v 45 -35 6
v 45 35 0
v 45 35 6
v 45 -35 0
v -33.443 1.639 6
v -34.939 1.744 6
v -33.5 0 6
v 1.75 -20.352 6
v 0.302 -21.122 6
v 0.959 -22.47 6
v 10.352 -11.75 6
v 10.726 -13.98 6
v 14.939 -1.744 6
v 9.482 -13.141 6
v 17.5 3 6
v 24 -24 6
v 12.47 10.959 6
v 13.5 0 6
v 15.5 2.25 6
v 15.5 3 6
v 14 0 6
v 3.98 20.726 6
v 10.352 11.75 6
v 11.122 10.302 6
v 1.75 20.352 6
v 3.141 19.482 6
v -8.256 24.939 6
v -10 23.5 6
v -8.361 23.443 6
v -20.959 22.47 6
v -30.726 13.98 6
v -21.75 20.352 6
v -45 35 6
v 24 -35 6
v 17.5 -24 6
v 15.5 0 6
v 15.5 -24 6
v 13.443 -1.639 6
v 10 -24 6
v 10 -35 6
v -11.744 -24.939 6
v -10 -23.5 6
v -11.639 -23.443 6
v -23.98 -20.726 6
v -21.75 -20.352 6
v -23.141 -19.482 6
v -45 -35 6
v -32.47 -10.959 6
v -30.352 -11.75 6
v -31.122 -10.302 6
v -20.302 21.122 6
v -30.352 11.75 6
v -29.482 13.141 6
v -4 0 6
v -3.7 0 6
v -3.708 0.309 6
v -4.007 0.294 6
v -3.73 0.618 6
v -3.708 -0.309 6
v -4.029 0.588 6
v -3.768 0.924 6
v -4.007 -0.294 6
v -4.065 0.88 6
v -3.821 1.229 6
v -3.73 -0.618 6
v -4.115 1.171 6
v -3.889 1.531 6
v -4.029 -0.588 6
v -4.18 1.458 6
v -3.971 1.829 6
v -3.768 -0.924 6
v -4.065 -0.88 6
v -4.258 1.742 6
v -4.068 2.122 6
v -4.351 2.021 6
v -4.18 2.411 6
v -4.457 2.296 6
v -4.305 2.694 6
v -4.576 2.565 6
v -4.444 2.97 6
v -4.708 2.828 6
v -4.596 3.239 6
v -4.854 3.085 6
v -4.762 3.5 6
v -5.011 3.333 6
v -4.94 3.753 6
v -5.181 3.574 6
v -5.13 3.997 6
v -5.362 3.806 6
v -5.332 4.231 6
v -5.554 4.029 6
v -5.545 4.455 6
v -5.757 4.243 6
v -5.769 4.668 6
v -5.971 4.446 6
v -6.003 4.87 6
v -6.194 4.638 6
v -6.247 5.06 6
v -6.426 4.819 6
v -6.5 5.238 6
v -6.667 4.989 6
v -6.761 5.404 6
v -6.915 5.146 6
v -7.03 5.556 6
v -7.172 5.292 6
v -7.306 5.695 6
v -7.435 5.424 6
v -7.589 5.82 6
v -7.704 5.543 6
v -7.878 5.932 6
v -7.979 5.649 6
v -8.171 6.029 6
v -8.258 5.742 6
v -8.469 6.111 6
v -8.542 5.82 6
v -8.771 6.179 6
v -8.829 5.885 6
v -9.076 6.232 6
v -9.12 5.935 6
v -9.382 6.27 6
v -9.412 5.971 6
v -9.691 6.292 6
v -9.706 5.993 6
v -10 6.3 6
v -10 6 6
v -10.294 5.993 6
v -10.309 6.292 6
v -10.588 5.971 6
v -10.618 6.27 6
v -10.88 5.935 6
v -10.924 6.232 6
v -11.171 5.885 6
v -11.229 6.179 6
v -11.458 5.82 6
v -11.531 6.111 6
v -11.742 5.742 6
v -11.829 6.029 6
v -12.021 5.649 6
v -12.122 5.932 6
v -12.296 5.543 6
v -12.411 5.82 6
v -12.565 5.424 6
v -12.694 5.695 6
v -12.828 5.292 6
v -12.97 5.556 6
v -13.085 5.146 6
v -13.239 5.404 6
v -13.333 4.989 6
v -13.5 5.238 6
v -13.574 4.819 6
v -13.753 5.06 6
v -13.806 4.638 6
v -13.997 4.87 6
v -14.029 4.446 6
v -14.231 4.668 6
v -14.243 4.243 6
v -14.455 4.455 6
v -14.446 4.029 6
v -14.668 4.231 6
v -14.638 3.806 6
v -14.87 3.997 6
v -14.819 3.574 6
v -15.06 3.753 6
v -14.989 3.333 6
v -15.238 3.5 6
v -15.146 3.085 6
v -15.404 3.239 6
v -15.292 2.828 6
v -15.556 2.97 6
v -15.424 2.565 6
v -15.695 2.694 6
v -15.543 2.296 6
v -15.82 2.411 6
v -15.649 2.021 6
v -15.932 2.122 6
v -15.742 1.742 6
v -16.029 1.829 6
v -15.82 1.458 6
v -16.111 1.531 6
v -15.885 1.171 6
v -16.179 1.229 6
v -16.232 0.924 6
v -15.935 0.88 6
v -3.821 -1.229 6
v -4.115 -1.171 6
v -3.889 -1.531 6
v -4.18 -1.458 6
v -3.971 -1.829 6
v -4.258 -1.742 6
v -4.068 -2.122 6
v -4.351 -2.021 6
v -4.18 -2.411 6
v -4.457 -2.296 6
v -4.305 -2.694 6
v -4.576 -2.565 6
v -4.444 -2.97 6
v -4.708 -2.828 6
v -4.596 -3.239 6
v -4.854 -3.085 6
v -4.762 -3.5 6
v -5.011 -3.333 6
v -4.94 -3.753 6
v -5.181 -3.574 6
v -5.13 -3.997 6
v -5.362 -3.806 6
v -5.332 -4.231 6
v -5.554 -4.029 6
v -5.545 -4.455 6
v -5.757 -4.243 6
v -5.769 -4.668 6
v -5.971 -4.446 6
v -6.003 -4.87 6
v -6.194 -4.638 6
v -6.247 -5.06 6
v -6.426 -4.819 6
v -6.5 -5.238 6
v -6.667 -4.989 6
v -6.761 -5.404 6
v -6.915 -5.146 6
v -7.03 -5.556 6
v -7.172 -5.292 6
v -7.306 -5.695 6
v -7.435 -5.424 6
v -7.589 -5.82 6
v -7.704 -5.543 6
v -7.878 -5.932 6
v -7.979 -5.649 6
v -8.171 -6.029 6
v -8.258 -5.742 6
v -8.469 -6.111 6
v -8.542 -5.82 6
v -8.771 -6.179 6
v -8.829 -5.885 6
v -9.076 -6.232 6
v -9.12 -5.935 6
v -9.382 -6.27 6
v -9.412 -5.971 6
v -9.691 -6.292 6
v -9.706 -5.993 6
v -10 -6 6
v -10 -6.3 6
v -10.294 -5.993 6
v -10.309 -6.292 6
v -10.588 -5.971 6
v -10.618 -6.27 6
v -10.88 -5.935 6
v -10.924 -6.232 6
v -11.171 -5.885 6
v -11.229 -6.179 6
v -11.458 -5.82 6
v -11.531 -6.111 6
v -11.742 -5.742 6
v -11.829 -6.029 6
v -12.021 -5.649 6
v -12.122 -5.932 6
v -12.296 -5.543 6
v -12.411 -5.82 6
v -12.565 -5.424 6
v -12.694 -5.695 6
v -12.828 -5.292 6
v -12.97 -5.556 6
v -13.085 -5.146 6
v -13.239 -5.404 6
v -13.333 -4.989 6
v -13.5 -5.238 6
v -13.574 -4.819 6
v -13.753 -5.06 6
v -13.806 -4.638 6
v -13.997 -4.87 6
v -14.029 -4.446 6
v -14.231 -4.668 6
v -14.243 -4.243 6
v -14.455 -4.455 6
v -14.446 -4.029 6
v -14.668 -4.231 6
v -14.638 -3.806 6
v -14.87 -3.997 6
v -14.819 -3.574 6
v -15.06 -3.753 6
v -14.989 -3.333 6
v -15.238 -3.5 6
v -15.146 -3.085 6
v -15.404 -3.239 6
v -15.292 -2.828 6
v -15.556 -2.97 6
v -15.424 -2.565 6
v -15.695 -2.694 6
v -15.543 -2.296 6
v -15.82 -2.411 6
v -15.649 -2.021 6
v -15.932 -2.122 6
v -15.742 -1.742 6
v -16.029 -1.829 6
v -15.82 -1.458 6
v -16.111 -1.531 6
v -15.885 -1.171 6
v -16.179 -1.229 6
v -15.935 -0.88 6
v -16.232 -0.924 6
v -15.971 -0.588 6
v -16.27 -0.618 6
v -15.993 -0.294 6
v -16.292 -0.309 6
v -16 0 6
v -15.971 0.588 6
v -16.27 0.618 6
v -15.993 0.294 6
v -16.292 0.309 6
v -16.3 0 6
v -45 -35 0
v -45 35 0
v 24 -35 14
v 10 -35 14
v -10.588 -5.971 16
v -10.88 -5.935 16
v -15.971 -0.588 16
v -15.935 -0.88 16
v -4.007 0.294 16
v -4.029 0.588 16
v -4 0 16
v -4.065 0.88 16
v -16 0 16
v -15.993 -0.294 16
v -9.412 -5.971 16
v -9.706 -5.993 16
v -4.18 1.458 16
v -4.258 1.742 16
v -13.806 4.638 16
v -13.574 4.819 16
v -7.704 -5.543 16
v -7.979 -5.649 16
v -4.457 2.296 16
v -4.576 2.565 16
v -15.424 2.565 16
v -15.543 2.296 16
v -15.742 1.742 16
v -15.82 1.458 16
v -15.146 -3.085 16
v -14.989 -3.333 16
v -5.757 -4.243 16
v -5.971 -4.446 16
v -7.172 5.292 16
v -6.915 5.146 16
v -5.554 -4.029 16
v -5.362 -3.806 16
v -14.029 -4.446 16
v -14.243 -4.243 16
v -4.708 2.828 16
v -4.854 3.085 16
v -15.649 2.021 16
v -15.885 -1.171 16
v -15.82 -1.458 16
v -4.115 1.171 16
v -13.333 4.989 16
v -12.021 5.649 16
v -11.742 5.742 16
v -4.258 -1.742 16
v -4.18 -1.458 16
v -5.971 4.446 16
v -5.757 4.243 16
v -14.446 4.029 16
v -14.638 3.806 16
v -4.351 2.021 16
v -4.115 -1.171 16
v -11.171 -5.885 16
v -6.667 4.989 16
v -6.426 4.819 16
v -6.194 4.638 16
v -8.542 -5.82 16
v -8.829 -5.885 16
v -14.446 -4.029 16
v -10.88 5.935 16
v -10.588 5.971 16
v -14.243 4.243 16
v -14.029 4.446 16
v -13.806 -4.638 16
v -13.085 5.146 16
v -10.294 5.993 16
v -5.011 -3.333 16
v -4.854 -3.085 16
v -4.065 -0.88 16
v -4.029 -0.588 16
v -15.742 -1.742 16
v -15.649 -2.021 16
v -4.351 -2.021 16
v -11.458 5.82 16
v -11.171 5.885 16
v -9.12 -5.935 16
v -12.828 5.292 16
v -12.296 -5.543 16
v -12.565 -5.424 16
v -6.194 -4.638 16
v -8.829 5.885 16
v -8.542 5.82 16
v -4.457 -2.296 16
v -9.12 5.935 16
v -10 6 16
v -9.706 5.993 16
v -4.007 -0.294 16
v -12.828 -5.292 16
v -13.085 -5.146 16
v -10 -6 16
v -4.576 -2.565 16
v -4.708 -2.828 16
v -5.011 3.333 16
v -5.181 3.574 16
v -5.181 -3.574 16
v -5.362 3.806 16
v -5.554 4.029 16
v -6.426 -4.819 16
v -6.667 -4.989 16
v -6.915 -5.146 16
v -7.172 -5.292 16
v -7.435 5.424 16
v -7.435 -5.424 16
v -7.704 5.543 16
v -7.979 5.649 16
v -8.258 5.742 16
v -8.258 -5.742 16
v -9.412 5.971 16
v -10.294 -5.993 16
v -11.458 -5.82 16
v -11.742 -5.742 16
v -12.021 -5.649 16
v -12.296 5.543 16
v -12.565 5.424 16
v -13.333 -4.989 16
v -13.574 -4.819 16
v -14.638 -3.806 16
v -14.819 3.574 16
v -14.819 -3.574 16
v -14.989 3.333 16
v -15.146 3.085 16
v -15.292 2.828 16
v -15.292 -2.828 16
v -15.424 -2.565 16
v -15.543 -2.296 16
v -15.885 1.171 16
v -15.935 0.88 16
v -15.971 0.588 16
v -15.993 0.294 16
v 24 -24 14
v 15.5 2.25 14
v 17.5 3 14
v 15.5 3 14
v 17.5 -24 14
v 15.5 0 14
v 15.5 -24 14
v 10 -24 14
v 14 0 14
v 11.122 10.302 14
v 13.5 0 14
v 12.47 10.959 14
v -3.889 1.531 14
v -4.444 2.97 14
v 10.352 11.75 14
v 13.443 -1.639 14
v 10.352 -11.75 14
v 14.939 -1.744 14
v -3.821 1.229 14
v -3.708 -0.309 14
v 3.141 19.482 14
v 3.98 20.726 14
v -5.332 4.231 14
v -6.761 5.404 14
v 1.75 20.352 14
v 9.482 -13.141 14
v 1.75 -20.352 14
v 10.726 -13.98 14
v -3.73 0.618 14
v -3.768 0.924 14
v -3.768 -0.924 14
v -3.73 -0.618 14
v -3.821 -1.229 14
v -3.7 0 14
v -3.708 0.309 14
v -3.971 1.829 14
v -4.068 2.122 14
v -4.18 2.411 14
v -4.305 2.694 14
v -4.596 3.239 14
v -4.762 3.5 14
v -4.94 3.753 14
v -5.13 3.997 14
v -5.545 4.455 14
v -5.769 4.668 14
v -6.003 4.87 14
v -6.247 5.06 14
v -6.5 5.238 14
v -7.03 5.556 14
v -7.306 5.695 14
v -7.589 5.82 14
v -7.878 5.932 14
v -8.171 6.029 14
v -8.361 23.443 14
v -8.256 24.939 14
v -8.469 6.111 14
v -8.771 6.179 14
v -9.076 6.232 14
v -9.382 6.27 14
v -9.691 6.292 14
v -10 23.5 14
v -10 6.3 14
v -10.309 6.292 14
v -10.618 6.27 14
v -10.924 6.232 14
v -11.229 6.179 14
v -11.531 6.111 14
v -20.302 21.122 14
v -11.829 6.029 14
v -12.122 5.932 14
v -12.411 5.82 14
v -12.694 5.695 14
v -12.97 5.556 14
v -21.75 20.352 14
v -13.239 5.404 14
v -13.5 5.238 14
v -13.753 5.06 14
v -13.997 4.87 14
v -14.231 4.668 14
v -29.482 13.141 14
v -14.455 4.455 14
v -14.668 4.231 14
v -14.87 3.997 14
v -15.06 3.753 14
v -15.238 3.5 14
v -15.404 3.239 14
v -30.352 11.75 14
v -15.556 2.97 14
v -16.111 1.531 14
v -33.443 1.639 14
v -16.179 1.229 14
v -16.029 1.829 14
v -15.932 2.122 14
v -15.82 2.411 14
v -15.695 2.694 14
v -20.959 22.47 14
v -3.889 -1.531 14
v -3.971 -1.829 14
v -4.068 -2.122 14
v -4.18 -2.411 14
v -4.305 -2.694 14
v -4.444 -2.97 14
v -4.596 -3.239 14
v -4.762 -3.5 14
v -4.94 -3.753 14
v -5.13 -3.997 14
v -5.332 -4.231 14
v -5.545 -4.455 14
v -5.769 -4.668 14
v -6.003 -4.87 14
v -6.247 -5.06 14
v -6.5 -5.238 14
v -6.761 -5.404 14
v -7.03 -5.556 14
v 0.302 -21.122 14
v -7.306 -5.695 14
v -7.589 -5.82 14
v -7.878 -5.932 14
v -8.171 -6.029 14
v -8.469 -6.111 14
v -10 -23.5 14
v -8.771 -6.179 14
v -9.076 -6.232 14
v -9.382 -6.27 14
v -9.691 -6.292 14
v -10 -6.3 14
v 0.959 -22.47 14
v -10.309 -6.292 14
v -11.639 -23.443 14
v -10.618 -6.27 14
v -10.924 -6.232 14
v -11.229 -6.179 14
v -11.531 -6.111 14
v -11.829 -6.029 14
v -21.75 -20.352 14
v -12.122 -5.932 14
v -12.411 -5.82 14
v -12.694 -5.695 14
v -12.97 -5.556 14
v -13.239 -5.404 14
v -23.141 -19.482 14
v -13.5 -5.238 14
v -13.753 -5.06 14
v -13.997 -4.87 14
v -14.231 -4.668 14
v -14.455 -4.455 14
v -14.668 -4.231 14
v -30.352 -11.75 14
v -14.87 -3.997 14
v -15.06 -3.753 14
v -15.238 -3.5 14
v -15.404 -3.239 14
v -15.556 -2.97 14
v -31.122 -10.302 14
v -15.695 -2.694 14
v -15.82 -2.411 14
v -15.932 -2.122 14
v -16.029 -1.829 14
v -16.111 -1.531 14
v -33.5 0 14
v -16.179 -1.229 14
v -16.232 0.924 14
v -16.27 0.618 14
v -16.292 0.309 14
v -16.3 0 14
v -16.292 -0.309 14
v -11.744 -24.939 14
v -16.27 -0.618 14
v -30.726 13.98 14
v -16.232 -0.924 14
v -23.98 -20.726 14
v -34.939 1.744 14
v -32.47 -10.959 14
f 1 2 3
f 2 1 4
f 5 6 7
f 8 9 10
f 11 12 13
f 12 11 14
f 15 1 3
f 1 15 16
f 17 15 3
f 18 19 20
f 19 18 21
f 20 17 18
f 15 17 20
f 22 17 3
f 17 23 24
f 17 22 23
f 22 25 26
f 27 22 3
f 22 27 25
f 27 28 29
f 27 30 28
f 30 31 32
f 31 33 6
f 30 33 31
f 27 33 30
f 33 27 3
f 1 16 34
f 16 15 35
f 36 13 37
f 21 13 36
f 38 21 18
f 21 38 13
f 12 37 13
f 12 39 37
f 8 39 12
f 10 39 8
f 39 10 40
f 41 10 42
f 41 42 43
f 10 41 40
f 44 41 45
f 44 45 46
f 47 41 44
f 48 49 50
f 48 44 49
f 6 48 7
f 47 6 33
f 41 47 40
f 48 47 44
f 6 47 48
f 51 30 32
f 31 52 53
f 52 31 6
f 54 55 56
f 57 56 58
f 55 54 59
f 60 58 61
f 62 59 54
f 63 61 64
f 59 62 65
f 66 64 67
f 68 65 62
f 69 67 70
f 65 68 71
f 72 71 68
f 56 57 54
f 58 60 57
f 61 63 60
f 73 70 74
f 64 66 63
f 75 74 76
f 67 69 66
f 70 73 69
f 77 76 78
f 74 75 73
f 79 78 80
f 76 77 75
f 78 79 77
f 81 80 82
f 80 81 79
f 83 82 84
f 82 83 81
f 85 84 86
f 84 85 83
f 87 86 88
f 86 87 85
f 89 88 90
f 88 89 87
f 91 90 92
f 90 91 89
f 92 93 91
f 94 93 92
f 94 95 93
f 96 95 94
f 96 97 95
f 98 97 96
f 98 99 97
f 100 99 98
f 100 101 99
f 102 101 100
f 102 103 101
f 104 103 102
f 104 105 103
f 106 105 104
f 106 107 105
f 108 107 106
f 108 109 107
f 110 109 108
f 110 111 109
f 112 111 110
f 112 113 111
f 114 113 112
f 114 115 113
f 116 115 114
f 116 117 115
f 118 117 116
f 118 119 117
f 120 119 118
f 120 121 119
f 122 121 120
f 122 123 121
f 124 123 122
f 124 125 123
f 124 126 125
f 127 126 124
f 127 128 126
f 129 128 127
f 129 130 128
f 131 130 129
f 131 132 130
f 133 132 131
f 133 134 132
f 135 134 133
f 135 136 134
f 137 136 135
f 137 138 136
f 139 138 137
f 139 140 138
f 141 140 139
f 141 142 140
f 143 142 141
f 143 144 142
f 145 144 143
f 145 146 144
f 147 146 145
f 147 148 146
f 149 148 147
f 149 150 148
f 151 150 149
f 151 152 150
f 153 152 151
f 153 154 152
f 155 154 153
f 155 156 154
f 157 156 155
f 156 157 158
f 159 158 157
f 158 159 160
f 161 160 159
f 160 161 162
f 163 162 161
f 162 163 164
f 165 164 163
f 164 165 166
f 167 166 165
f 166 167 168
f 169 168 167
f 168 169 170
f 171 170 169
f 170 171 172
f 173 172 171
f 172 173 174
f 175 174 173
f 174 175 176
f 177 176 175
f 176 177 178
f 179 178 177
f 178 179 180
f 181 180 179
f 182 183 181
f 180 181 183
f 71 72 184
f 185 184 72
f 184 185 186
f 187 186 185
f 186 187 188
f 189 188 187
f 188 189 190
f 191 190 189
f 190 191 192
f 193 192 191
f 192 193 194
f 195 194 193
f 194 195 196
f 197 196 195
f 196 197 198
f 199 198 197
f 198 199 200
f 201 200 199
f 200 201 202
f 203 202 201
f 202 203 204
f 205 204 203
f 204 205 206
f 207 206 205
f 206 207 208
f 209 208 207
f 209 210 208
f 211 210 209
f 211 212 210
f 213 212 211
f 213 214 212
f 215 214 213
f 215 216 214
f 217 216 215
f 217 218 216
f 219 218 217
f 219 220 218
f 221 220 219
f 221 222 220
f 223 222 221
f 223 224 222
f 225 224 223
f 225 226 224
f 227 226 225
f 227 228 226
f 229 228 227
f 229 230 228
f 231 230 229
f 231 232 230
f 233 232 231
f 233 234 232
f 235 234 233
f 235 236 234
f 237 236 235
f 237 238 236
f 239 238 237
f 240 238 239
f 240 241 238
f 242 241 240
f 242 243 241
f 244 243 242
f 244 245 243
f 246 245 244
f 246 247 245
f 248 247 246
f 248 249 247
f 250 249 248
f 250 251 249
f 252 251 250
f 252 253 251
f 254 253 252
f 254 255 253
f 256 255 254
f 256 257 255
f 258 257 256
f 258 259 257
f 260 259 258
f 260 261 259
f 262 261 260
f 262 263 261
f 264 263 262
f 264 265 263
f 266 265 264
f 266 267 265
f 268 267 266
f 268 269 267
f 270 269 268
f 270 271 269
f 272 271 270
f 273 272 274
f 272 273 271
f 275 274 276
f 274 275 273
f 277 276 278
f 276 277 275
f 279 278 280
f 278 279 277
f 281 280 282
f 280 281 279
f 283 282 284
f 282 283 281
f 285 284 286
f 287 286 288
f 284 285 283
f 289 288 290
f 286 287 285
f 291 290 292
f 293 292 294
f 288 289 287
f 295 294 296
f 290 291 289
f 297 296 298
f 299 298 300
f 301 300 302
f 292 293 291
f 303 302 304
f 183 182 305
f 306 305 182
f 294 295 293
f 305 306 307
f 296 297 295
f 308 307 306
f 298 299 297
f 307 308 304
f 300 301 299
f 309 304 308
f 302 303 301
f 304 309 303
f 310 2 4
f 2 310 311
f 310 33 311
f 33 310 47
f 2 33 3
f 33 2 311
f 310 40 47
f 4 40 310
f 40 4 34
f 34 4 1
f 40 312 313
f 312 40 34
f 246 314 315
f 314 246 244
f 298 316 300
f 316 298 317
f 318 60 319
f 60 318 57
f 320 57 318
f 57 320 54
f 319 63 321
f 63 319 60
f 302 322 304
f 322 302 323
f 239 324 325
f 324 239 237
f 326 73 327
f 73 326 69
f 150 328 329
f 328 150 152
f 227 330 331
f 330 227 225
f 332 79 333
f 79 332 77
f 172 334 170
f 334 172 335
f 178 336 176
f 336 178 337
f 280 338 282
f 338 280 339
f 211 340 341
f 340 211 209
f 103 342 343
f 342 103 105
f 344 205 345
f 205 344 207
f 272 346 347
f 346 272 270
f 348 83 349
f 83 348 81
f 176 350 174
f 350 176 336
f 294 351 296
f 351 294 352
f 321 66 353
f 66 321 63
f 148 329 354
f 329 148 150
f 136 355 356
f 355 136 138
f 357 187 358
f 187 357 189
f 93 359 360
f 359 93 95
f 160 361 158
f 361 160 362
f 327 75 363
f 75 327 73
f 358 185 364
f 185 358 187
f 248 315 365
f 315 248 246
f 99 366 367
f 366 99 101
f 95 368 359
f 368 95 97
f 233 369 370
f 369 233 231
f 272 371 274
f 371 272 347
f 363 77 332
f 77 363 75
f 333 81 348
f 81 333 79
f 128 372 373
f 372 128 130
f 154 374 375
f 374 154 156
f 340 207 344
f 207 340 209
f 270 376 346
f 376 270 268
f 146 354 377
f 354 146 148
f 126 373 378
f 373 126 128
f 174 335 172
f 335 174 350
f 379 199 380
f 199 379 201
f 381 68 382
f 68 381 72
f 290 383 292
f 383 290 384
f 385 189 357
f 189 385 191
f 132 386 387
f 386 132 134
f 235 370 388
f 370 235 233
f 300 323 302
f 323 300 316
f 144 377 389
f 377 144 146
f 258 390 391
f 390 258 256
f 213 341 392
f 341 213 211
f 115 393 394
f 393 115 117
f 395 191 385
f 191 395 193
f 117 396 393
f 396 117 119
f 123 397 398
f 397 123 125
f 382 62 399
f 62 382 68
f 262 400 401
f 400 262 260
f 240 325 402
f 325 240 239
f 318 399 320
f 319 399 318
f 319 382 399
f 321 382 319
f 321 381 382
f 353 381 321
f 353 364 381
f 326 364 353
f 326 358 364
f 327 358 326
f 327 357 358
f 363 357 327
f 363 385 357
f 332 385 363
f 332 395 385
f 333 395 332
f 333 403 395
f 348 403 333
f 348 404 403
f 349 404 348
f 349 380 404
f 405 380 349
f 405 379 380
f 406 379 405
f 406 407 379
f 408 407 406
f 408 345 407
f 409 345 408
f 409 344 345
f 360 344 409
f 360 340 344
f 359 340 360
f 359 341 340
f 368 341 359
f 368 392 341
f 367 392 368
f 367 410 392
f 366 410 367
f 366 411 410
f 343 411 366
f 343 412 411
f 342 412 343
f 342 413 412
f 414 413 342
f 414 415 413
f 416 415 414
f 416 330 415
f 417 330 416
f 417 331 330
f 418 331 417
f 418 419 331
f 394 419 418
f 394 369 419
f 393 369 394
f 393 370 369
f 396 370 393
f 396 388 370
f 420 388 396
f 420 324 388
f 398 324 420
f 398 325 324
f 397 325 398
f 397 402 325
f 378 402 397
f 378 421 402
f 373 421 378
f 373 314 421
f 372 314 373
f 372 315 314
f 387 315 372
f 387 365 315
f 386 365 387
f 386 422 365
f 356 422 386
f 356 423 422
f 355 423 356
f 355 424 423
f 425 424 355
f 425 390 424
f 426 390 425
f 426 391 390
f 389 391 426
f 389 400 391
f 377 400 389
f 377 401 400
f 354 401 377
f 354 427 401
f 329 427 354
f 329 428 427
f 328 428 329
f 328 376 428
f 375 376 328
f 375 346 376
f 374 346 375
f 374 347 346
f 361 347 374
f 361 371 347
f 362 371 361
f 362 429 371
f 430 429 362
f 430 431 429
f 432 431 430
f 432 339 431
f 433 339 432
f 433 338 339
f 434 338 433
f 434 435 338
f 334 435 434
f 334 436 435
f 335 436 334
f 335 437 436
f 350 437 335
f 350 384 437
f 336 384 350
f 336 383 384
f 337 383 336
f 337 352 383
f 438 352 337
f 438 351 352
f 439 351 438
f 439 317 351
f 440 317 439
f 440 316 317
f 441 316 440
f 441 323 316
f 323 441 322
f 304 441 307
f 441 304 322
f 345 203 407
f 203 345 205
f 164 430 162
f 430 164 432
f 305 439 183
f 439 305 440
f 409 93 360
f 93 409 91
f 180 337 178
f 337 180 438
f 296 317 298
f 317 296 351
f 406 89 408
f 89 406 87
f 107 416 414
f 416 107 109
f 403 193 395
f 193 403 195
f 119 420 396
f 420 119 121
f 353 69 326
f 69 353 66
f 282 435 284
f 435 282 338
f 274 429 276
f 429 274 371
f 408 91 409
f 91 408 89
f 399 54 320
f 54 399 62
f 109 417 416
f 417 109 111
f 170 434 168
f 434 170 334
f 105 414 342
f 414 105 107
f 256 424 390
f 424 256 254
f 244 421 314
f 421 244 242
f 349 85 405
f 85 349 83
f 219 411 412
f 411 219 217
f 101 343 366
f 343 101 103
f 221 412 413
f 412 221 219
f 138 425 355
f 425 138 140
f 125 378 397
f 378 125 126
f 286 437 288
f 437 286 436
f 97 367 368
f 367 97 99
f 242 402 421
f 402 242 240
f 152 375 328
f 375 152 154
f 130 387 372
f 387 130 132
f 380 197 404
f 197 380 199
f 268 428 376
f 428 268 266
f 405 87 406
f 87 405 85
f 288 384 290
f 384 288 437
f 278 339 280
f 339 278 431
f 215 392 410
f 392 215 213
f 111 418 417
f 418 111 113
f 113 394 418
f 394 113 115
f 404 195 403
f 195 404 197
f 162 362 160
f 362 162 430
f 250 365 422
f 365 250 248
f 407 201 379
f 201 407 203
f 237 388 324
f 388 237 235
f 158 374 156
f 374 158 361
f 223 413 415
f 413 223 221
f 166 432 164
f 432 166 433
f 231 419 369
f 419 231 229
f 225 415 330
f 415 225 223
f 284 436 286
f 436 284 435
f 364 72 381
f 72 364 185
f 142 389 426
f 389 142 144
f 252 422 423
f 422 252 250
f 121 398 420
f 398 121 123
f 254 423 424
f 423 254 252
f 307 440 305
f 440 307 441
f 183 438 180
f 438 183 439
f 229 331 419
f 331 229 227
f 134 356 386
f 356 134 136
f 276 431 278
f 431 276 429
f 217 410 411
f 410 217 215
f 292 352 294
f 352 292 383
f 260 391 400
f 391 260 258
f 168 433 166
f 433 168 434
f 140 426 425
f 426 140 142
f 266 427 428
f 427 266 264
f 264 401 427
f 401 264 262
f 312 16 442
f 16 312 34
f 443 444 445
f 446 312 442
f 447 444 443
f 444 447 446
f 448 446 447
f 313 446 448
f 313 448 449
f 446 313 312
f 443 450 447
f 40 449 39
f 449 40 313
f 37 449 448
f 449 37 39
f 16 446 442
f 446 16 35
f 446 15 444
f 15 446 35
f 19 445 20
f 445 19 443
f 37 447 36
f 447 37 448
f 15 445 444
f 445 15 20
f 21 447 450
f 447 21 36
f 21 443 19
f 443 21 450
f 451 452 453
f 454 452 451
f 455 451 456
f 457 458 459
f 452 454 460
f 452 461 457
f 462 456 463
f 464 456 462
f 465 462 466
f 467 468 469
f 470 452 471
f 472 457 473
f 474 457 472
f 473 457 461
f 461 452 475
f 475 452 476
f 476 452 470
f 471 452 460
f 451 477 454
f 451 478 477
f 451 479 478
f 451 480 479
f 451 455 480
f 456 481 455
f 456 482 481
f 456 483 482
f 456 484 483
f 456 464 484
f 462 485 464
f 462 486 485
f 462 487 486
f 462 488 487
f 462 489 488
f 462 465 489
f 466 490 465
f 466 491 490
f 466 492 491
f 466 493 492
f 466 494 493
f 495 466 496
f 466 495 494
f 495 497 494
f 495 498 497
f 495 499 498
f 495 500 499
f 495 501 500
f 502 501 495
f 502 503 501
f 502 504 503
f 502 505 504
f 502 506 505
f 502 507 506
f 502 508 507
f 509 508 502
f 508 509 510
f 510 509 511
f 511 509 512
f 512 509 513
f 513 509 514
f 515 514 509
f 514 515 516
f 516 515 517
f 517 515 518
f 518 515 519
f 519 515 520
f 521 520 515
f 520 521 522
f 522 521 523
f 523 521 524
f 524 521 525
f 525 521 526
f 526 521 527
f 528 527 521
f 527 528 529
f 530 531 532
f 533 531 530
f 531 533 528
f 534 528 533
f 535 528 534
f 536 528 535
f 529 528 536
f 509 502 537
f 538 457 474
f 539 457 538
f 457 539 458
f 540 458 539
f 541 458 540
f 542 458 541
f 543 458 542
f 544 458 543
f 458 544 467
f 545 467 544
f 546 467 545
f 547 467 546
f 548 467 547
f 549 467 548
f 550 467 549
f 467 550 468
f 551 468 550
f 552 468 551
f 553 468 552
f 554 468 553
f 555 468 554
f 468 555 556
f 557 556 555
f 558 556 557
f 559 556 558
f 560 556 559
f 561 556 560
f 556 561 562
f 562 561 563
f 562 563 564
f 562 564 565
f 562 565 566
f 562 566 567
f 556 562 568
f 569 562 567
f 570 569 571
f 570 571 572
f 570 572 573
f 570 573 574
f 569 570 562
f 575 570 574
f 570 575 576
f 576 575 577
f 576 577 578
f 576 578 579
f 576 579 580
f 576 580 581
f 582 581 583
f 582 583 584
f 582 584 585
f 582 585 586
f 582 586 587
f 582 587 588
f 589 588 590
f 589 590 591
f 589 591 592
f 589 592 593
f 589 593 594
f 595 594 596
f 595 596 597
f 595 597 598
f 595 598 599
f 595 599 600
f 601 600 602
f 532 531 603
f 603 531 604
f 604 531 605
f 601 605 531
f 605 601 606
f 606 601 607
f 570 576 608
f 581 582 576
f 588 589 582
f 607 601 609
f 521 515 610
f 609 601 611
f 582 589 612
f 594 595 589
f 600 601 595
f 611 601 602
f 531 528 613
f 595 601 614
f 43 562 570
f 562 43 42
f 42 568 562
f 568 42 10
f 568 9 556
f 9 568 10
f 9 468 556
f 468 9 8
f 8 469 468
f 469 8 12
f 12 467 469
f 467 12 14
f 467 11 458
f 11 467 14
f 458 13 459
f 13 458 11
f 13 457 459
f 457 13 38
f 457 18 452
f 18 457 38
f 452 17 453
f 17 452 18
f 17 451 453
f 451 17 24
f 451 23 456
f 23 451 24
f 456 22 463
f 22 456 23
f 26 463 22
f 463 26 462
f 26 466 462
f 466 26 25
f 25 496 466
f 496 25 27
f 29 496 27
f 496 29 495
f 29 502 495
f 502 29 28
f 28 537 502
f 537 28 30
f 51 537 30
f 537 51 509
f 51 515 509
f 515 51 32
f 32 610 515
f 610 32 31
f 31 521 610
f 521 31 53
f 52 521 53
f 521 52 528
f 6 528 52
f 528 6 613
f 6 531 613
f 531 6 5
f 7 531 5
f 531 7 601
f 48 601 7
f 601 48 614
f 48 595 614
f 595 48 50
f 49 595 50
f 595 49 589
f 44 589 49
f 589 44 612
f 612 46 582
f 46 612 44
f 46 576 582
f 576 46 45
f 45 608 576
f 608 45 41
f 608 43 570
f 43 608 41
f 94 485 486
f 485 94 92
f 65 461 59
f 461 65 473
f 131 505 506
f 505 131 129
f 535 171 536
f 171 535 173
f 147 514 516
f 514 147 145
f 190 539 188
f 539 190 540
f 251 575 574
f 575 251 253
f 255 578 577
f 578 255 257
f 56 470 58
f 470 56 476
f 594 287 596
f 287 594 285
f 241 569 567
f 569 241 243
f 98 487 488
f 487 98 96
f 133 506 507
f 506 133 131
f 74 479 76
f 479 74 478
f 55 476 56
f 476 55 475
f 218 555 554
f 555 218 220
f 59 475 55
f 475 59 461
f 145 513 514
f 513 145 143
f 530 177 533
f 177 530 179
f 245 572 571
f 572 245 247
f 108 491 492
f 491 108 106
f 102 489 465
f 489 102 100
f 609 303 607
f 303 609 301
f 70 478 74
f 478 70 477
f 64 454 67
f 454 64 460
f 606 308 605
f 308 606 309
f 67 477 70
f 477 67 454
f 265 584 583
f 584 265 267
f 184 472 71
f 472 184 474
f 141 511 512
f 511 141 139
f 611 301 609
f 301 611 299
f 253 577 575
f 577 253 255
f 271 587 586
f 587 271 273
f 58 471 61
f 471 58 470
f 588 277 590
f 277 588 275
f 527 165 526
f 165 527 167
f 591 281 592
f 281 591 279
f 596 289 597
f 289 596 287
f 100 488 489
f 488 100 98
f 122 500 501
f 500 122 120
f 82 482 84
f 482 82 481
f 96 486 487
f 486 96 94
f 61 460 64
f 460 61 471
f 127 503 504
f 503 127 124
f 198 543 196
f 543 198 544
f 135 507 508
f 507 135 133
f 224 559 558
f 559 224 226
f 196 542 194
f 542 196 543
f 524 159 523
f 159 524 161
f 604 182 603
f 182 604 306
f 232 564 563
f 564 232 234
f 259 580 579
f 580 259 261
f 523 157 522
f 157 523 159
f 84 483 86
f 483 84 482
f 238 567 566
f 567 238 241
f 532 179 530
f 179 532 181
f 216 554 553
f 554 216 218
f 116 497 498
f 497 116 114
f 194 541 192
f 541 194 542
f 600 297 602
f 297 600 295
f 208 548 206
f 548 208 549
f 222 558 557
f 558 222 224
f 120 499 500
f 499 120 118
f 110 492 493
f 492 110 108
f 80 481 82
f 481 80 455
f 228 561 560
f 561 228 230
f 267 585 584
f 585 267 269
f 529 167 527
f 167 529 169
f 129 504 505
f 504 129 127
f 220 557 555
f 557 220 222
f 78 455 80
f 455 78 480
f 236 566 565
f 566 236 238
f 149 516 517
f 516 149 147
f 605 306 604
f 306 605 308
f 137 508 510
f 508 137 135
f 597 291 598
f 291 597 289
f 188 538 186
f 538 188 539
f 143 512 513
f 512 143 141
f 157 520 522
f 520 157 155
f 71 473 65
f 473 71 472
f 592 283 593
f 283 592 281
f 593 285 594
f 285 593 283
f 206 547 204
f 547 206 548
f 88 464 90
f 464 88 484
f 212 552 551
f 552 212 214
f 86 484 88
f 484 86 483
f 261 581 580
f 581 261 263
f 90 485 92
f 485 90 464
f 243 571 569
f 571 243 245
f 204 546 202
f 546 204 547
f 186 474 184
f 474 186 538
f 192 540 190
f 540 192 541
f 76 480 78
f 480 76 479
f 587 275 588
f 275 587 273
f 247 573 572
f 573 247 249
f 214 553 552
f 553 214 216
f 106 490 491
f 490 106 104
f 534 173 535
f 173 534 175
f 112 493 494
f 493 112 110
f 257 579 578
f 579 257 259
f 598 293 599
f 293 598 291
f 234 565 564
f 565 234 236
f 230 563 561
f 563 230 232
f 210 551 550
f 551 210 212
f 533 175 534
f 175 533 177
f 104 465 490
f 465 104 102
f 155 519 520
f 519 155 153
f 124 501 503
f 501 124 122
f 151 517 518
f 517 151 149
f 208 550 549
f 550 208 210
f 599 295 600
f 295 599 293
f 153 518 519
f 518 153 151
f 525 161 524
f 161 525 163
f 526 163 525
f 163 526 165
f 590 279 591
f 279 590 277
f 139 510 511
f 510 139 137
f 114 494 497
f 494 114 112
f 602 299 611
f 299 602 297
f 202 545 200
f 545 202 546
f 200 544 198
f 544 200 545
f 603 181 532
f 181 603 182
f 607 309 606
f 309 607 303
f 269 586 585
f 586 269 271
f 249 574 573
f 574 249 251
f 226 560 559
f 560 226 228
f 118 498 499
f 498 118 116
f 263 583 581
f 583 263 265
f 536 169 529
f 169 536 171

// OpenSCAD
/* Ratchet wheel with spring pawl - PLA, 0.4 nozzle, no supports */
// Wheel ~50mm dia, 12 teeth. Free clockwise (from above), locks CCW.
// Print orientation: both parts flat, +Z up, bottom on bed.

/* [Part] */
part = "assembly"; // [wheel, base, assembly]
cadverify_only = "";
module instance(name, part, unit = 1) {
    echo(cadverify_instance = [name, part, unit]);
    if (cadverify_only == "" || cadverify_only == name) children();
}

// ---- parameters (mm) ----
Ro = 25;            // wheel tip radius (dia 50)
Rr = 23.5;          // wheel root radius (tooth height 1.5)
Nteeth = 12;
pitch = 360/Nteeth; // 30
gentle_span = 26;   // valley->tip CCW (gentle ramp)
wheel_t = 8;        // wheel thickness
bore_d = 12.6;      // wheel bore
post_d = 12;        // post diameter
post_h = 10;        // post height above base top
base_x = 90;
base_y = 70;
base_t = 6;
wheel_cx = -10;     // post/wheel centre in base coords
wheel_cy = 0;
base_top = base_t;  // 6
// pawl / arm
beam_x0 = 15.5; beam_x1 = 17.5;   // beam 2mm thick in X
beam_y0 = -30; beam_y1 = 3;       // beam length
beam_z0 = 6; beam_z1 = 14;        // beam height 8
tip_x = 14.0;       // pawl tip westmost (1.0 inside tip circle: 25-24=1.0)

$fn = 128;

// ---- wheel: centred at (0,0), bottom z=0 ----
module wheel() {
    difference() {
        linear_extrude(height = wheel_t, convexity = 4)
            polygon(points = [ for (i = [0:Nteeth-1]) each [
                [Rr*cos(i*pitch), Rr*sin(i*pitch)],
                [Ro*cos(i*pitch+gentle_span), Ro*sin(i*pitch+gentle_span)],
                [Rr*cos(i*pitch+gentle_span), Rr*sin(i*pitch+gentle_span)]
            ]]);
        translate([0,0,-1]) cylinder(d = bore_d, h = wheel_t+2);
    }
}

// ---- base: plate centred at origin, bottom z=0, post at (wheel_cx,wheel_cy) ----
module base() {
    union() {
        // plate
        translate([-base_x/2, -base_y/2, 0]) cube([base_x, base_y, base_t]);
        // post
        translate([wheel_cx, wheel_cy, base_top]) cylinder(d = post_d, h = post_h);
        // anchor block
        translate([10, -35, 6]) cube([14, 11, 8]);
        // flexible beam (2mm thick, ~33mm long, 8mm tall)
        translate([beam_x0, beam_y0, beam_z0]) cube([beam_x1-beam_x0, beam_y1-beam_y0, beam_z1-beam_z0]);
        // pawl tip wedge: tip (tip_x,0), overlap 0.5 into beam; north ramp, south flat
        linear_extrude(height = 8, convexity = 2)
            polygon(points = [[tip_x,0],[16,0],[16,3]]);
        // shift pawl wedge up to beam height (extrude from 0 -> translate)
    }
}

// pawl wedge is extruded 0..8, need to lift to 6..14: wrap
module base_fixed() {
    union() {
        translate([-base_x/2, -base_y/2, 0]) cube([base_x, base_y, base_t]);
        translate([wheel_cx, wheel_cy, base_top]) cylinder(d = post_d, h = post_h);
        translate([10, -35, 6]) cube([14, 11, 8]);
        translate([beam_x0, beam_y0, beam_z0]) cube([beam_x1-beam_x0, beam_y1-beam_y0, beam_z1-beam_z0]);
        translate([0,0,6]) linear_extrude(height = 8, convexity = 2)
            polygon(points = [[tip_x,0],[16,0],[16,3]]);
    }
}

// ---- specs ----
if (part == "wheel") echo(cadverify_spec = [
    ["bounds", [[-Ro, -Ro, 0], [Ro, Ro, wheel_t]]],
    ["bodies", 1],
    ["through_holes", 1],
    ["support_faces", [["bed", "-z", 1000]]],
    ["overhangs_allowed", []],
    ["copies", 1],
    ["details", [
        ["bore", "hole", [0, 0, 10], [0, 0, -1], [[0, bore_d], [wheel_t-0.5, bore_d]]],
        ["rim", "thickness", [0, 15, 10], [0, 0, -1], wheel_t],
        ["tooth", "material", [[21.5, 9.5, 0], [23.5, 11.5, wheel_t]], 0.4],
        ["teeth", "view", [[20, -25, 0], [Ro, 25, wheel_t]]]
    ]]
]);

if (part == "base") echo(cadverify_spec = [
    ["bounds", [[-base_x/2, -base_y/2, 0], [base_x/2, base_y/2, base_top+post_h]]],
    ["bodies", 1],
    ["support_faces", [["bed", "-z", 4000]]],
    ["overhangs_allowed", []],
    ["copies", 1],
    ["details", [
        ["plate", "thickness", [-30, 20, 10], [0, 0, -1], base_t],
        ["post", "material", [[wheel_cx-6, wheel_cy-6, base_top], [wheel_cx+6, wheel_cy+6, base_top+post_h]], 0.5],
        ["arm", "material", [[beam_x0, beam_y0, beam_z0], [beam_x1, beam_y1, beam_z1]], 0.9],
        ["pawl_tip", "view", [[14.0, -1, 6], [16, 3.5, 14]]]
    ]]
]);

if (part == "assembly") echo(cadverify_spec = [
    ["bounds", [[-base_x/2, -base_y/2, 0], [base_x/2, base_y/2, base_top+post_h]]],
    ["motions", [
        ["click", ["wheel1"], "rotate", [wheel_cx, wheel_cy, base_top], [0, 0, 1], [0, -360],
            ["flex", [["wheel1", "base1", 1.0, "pawl flexes over teeth"]]]]
    ]],
    ["assembly_order", [
        [["base1"], [0, 0, 0]],
        [["wheel1"], [0, 0, -30], ["flex", [["wheel1", "base1", 1.0, "pawl snaps aside as rim passes"]]]]
    ]]
]);

// ---- geometry dispatch ----
if (part == "wheel") wheel();
else if (part == "base") base_fixed();
else if (part == "assembly") {
    instance("base1", "base") base_fixed();
    instance("wheel1", "wheel") translate([wheel_cx, wheel_cy, base_top]) wheel();
}
